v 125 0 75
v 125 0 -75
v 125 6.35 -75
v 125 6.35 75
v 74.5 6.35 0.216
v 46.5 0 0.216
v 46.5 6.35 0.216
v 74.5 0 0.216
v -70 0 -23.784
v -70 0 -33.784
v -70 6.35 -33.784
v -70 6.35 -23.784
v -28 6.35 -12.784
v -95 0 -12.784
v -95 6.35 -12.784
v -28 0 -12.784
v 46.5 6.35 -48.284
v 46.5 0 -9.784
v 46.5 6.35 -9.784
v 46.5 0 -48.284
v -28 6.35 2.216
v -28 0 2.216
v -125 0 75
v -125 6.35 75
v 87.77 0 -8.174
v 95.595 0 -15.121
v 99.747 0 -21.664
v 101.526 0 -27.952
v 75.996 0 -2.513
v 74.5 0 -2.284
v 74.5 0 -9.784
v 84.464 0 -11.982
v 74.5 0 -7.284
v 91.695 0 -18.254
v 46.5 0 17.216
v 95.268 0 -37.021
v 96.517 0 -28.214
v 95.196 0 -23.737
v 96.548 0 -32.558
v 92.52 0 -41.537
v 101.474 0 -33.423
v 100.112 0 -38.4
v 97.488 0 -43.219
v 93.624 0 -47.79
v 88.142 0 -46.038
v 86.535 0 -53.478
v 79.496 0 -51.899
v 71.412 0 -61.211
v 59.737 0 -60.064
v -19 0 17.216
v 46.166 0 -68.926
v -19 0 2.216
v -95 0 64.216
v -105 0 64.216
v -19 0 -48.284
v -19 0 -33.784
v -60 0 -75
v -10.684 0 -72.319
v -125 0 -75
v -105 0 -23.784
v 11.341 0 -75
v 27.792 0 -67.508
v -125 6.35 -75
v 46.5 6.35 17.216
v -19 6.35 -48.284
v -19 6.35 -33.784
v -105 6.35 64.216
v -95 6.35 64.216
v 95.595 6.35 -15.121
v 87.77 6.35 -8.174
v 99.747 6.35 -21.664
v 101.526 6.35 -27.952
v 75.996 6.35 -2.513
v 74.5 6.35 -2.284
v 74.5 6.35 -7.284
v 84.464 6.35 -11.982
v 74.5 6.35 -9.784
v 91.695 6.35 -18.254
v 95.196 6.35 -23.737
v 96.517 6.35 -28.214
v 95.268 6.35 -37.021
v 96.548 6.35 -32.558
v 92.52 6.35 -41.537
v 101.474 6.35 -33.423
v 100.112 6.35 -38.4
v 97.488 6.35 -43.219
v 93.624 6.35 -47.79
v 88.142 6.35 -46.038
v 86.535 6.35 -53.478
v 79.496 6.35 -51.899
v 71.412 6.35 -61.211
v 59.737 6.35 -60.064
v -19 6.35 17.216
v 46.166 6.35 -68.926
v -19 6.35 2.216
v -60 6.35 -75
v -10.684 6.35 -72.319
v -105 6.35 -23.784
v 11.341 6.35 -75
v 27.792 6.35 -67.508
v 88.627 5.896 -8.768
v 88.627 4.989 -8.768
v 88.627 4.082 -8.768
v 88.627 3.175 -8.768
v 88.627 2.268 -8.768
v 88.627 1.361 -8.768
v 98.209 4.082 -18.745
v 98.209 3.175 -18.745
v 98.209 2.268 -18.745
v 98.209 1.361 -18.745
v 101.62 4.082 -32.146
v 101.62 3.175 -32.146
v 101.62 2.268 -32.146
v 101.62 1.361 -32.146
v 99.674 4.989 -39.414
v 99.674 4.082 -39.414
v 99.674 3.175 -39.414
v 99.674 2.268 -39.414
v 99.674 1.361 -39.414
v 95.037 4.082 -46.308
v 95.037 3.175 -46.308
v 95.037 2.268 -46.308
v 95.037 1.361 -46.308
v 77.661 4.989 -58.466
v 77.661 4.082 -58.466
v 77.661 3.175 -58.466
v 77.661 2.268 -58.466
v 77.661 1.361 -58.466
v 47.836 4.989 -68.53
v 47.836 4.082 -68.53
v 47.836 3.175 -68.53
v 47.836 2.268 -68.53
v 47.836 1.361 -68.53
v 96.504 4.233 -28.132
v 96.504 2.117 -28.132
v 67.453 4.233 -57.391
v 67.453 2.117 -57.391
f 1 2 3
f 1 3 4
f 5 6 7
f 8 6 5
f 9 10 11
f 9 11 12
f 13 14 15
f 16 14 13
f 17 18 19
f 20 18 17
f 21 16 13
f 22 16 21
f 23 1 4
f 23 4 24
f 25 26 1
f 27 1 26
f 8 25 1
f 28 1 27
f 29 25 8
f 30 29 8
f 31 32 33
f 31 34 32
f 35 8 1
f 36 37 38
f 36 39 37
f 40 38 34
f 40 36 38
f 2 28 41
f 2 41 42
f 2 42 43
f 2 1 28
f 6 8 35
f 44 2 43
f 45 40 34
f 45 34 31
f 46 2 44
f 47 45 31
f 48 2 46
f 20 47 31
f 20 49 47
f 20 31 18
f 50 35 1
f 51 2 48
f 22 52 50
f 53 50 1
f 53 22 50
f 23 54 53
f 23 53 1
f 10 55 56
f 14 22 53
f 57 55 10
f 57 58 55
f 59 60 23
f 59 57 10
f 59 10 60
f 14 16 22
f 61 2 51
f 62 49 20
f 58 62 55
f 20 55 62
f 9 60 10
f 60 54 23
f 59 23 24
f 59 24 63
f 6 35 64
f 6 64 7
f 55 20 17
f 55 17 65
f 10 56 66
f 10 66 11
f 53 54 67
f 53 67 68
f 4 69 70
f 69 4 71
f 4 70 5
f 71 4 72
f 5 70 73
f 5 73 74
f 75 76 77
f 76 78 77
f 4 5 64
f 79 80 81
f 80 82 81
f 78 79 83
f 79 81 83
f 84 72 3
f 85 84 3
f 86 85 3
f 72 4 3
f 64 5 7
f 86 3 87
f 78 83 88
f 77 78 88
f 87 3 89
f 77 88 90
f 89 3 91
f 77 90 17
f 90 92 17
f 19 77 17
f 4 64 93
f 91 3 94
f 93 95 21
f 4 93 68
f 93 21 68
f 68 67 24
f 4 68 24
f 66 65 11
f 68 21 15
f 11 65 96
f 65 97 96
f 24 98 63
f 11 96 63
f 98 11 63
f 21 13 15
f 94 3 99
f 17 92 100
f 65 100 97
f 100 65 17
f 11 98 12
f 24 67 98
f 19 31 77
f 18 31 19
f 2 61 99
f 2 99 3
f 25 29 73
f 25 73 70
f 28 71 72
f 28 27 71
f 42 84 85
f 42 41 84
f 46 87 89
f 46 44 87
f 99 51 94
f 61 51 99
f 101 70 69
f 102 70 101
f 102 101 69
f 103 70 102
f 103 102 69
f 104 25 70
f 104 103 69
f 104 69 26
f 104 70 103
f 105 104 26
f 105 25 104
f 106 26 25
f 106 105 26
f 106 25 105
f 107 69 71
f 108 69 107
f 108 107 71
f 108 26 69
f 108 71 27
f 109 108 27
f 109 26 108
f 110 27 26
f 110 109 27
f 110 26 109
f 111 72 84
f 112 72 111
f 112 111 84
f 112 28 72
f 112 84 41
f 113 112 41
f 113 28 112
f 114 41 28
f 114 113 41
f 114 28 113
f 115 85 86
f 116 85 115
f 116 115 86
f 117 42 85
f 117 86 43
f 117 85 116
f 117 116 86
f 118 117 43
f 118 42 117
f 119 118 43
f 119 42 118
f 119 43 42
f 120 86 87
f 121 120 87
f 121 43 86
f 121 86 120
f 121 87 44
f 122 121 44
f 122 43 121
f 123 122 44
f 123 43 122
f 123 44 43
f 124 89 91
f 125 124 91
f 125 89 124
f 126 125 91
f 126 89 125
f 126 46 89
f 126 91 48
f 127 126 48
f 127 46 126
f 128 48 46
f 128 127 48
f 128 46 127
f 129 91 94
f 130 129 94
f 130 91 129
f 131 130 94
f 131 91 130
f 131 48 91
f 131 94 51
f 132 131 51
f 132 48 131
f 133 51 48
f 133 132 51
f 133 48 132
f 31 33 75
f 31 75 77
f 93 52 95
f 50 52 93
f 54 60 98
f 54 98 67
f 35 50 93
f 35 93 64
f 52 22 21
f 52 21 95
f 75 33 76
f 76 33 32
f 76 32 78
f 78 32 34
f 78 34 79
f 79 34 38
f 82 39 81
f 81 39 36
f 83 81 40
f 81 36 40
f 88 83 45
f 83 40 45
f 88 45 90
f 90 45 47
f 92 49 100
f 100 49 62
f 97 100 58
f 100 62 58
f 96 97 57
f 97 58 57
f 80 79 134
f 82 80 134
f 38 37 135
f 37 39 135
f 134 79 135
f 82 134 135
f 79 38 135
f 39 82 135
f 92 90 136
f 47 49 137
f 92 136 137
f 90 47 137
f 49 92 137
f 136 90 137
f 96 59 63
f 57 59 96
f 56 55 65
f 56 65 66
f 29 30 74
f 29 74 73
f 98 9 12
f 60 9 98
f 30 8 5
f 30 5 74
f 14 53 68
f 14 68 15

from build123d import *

# Parameters (mm, degrees)
BOSS_EXTRUDE1_DEPTH = 6.35


with BuildPart() as part:
    # Sketch1 → Boss-Extrude1 (new body)
    with BuildSketch(Plane(origin=(0, 0, 0), x_dir=(1, 0, 0), z_dir=(0, 1, 0))):
        with BuildLine():
            Line((-105, -64.215517859), (-95, -64.215517859))
            Line((-95, -64.215517859), (-95, 12.784482141))
            Line((-95, 12.784482141), (-28, 12.784482141))
            Line((-28, 12.784482141), (-28, -2.215517859))
            Line((-28, -2.215517859), (-19, -2.215517859))
            Line((-19, -2.215517859), (-19, -17.215517859))
            Line((-19, -17.215517859), (46.5, -17.215517859))
            Line((46.5, -17.215517859), (46.5, -0.215517859))
            Line((46.5, -0.215517859), (74.5, -0.215517859))
            Line((74.5, -0.215517859), (74.5, 2.284482141))
            Line((74.5, 2.284482141), (75.995811983, 2.513471084))
            add(Edge.make_bspline(
                [(75.995811983, 2.513471084), (80.478945809, 3.91902752), (86.955874182, 7.104080495), (94.127927524, 13.158287334), (98.453325684, 18.591579482), (101.313529062, 24.942550659), (102.069690209, 32.110869763), (100.125264278, 39.491428955), (95.470460142, 46.405997638), (88.214059069, 52.733240312), (78.176732194, 58.54884887), (65.04289901, 63.866927528), (48.466875468, 68.636346268), (31.498822927, 72.078754421), (18.408481383, 74.071157306), (12.810694193, 74.812442252), (11.34053229, 75)],
                knots=[0, 0, 0, 0, 0.125, 0.1875, 0.25, 0.3125, 0.375, 0.4375, 0.5, 0.5625, 0.625, 0.6875, 0.75, 0.8125, 0.84375, 0.854655416, 0.854655416, 0.854655416, 0.854655416], degree=3))
            Line((11.34053229, 75), (125, 75))
            Line((125, 75), (125, -75))
            Line((125, -75), (-125, -75))
            Line((-125, -75), (-125, 75))
            Line((-125, 75), (-60, 75))
            add(Edge.make_bspline(
                [(74.5, 7.284482141), (106.249859102, 17.238728555), (132.436668925, 69.90318377), (-60, 75)],
                knots=[0, 0, 0, 0, 1, 1, 1, 1], degree=3))
            Line((74.5, 7.284482141), (74.5, 9.784482141))
            Line((74.5, 9.784482141), (46.5, 9.784482141))
            Line((46.5, 9.784482141), (46.5, 48.284482141))
            Line((46.5, 48.284482141), (-19, 48.284482141))
            Line((-19, 48.284482141), (-19, 33.784482141))
            Line((-19, 33.784482141), (-70, 33.784482141))
            Line((-70, 33.784482141), (-70, 23.784482141))
            Line((-70, 23.784482141), (-105, 23.784482141))
            Line((-105, 23.784482141), (-105, -64.215517859))
        make_face()
    extrude(amount=BOSS_EXTRUDE1_DEPTH)


solid = part.part
